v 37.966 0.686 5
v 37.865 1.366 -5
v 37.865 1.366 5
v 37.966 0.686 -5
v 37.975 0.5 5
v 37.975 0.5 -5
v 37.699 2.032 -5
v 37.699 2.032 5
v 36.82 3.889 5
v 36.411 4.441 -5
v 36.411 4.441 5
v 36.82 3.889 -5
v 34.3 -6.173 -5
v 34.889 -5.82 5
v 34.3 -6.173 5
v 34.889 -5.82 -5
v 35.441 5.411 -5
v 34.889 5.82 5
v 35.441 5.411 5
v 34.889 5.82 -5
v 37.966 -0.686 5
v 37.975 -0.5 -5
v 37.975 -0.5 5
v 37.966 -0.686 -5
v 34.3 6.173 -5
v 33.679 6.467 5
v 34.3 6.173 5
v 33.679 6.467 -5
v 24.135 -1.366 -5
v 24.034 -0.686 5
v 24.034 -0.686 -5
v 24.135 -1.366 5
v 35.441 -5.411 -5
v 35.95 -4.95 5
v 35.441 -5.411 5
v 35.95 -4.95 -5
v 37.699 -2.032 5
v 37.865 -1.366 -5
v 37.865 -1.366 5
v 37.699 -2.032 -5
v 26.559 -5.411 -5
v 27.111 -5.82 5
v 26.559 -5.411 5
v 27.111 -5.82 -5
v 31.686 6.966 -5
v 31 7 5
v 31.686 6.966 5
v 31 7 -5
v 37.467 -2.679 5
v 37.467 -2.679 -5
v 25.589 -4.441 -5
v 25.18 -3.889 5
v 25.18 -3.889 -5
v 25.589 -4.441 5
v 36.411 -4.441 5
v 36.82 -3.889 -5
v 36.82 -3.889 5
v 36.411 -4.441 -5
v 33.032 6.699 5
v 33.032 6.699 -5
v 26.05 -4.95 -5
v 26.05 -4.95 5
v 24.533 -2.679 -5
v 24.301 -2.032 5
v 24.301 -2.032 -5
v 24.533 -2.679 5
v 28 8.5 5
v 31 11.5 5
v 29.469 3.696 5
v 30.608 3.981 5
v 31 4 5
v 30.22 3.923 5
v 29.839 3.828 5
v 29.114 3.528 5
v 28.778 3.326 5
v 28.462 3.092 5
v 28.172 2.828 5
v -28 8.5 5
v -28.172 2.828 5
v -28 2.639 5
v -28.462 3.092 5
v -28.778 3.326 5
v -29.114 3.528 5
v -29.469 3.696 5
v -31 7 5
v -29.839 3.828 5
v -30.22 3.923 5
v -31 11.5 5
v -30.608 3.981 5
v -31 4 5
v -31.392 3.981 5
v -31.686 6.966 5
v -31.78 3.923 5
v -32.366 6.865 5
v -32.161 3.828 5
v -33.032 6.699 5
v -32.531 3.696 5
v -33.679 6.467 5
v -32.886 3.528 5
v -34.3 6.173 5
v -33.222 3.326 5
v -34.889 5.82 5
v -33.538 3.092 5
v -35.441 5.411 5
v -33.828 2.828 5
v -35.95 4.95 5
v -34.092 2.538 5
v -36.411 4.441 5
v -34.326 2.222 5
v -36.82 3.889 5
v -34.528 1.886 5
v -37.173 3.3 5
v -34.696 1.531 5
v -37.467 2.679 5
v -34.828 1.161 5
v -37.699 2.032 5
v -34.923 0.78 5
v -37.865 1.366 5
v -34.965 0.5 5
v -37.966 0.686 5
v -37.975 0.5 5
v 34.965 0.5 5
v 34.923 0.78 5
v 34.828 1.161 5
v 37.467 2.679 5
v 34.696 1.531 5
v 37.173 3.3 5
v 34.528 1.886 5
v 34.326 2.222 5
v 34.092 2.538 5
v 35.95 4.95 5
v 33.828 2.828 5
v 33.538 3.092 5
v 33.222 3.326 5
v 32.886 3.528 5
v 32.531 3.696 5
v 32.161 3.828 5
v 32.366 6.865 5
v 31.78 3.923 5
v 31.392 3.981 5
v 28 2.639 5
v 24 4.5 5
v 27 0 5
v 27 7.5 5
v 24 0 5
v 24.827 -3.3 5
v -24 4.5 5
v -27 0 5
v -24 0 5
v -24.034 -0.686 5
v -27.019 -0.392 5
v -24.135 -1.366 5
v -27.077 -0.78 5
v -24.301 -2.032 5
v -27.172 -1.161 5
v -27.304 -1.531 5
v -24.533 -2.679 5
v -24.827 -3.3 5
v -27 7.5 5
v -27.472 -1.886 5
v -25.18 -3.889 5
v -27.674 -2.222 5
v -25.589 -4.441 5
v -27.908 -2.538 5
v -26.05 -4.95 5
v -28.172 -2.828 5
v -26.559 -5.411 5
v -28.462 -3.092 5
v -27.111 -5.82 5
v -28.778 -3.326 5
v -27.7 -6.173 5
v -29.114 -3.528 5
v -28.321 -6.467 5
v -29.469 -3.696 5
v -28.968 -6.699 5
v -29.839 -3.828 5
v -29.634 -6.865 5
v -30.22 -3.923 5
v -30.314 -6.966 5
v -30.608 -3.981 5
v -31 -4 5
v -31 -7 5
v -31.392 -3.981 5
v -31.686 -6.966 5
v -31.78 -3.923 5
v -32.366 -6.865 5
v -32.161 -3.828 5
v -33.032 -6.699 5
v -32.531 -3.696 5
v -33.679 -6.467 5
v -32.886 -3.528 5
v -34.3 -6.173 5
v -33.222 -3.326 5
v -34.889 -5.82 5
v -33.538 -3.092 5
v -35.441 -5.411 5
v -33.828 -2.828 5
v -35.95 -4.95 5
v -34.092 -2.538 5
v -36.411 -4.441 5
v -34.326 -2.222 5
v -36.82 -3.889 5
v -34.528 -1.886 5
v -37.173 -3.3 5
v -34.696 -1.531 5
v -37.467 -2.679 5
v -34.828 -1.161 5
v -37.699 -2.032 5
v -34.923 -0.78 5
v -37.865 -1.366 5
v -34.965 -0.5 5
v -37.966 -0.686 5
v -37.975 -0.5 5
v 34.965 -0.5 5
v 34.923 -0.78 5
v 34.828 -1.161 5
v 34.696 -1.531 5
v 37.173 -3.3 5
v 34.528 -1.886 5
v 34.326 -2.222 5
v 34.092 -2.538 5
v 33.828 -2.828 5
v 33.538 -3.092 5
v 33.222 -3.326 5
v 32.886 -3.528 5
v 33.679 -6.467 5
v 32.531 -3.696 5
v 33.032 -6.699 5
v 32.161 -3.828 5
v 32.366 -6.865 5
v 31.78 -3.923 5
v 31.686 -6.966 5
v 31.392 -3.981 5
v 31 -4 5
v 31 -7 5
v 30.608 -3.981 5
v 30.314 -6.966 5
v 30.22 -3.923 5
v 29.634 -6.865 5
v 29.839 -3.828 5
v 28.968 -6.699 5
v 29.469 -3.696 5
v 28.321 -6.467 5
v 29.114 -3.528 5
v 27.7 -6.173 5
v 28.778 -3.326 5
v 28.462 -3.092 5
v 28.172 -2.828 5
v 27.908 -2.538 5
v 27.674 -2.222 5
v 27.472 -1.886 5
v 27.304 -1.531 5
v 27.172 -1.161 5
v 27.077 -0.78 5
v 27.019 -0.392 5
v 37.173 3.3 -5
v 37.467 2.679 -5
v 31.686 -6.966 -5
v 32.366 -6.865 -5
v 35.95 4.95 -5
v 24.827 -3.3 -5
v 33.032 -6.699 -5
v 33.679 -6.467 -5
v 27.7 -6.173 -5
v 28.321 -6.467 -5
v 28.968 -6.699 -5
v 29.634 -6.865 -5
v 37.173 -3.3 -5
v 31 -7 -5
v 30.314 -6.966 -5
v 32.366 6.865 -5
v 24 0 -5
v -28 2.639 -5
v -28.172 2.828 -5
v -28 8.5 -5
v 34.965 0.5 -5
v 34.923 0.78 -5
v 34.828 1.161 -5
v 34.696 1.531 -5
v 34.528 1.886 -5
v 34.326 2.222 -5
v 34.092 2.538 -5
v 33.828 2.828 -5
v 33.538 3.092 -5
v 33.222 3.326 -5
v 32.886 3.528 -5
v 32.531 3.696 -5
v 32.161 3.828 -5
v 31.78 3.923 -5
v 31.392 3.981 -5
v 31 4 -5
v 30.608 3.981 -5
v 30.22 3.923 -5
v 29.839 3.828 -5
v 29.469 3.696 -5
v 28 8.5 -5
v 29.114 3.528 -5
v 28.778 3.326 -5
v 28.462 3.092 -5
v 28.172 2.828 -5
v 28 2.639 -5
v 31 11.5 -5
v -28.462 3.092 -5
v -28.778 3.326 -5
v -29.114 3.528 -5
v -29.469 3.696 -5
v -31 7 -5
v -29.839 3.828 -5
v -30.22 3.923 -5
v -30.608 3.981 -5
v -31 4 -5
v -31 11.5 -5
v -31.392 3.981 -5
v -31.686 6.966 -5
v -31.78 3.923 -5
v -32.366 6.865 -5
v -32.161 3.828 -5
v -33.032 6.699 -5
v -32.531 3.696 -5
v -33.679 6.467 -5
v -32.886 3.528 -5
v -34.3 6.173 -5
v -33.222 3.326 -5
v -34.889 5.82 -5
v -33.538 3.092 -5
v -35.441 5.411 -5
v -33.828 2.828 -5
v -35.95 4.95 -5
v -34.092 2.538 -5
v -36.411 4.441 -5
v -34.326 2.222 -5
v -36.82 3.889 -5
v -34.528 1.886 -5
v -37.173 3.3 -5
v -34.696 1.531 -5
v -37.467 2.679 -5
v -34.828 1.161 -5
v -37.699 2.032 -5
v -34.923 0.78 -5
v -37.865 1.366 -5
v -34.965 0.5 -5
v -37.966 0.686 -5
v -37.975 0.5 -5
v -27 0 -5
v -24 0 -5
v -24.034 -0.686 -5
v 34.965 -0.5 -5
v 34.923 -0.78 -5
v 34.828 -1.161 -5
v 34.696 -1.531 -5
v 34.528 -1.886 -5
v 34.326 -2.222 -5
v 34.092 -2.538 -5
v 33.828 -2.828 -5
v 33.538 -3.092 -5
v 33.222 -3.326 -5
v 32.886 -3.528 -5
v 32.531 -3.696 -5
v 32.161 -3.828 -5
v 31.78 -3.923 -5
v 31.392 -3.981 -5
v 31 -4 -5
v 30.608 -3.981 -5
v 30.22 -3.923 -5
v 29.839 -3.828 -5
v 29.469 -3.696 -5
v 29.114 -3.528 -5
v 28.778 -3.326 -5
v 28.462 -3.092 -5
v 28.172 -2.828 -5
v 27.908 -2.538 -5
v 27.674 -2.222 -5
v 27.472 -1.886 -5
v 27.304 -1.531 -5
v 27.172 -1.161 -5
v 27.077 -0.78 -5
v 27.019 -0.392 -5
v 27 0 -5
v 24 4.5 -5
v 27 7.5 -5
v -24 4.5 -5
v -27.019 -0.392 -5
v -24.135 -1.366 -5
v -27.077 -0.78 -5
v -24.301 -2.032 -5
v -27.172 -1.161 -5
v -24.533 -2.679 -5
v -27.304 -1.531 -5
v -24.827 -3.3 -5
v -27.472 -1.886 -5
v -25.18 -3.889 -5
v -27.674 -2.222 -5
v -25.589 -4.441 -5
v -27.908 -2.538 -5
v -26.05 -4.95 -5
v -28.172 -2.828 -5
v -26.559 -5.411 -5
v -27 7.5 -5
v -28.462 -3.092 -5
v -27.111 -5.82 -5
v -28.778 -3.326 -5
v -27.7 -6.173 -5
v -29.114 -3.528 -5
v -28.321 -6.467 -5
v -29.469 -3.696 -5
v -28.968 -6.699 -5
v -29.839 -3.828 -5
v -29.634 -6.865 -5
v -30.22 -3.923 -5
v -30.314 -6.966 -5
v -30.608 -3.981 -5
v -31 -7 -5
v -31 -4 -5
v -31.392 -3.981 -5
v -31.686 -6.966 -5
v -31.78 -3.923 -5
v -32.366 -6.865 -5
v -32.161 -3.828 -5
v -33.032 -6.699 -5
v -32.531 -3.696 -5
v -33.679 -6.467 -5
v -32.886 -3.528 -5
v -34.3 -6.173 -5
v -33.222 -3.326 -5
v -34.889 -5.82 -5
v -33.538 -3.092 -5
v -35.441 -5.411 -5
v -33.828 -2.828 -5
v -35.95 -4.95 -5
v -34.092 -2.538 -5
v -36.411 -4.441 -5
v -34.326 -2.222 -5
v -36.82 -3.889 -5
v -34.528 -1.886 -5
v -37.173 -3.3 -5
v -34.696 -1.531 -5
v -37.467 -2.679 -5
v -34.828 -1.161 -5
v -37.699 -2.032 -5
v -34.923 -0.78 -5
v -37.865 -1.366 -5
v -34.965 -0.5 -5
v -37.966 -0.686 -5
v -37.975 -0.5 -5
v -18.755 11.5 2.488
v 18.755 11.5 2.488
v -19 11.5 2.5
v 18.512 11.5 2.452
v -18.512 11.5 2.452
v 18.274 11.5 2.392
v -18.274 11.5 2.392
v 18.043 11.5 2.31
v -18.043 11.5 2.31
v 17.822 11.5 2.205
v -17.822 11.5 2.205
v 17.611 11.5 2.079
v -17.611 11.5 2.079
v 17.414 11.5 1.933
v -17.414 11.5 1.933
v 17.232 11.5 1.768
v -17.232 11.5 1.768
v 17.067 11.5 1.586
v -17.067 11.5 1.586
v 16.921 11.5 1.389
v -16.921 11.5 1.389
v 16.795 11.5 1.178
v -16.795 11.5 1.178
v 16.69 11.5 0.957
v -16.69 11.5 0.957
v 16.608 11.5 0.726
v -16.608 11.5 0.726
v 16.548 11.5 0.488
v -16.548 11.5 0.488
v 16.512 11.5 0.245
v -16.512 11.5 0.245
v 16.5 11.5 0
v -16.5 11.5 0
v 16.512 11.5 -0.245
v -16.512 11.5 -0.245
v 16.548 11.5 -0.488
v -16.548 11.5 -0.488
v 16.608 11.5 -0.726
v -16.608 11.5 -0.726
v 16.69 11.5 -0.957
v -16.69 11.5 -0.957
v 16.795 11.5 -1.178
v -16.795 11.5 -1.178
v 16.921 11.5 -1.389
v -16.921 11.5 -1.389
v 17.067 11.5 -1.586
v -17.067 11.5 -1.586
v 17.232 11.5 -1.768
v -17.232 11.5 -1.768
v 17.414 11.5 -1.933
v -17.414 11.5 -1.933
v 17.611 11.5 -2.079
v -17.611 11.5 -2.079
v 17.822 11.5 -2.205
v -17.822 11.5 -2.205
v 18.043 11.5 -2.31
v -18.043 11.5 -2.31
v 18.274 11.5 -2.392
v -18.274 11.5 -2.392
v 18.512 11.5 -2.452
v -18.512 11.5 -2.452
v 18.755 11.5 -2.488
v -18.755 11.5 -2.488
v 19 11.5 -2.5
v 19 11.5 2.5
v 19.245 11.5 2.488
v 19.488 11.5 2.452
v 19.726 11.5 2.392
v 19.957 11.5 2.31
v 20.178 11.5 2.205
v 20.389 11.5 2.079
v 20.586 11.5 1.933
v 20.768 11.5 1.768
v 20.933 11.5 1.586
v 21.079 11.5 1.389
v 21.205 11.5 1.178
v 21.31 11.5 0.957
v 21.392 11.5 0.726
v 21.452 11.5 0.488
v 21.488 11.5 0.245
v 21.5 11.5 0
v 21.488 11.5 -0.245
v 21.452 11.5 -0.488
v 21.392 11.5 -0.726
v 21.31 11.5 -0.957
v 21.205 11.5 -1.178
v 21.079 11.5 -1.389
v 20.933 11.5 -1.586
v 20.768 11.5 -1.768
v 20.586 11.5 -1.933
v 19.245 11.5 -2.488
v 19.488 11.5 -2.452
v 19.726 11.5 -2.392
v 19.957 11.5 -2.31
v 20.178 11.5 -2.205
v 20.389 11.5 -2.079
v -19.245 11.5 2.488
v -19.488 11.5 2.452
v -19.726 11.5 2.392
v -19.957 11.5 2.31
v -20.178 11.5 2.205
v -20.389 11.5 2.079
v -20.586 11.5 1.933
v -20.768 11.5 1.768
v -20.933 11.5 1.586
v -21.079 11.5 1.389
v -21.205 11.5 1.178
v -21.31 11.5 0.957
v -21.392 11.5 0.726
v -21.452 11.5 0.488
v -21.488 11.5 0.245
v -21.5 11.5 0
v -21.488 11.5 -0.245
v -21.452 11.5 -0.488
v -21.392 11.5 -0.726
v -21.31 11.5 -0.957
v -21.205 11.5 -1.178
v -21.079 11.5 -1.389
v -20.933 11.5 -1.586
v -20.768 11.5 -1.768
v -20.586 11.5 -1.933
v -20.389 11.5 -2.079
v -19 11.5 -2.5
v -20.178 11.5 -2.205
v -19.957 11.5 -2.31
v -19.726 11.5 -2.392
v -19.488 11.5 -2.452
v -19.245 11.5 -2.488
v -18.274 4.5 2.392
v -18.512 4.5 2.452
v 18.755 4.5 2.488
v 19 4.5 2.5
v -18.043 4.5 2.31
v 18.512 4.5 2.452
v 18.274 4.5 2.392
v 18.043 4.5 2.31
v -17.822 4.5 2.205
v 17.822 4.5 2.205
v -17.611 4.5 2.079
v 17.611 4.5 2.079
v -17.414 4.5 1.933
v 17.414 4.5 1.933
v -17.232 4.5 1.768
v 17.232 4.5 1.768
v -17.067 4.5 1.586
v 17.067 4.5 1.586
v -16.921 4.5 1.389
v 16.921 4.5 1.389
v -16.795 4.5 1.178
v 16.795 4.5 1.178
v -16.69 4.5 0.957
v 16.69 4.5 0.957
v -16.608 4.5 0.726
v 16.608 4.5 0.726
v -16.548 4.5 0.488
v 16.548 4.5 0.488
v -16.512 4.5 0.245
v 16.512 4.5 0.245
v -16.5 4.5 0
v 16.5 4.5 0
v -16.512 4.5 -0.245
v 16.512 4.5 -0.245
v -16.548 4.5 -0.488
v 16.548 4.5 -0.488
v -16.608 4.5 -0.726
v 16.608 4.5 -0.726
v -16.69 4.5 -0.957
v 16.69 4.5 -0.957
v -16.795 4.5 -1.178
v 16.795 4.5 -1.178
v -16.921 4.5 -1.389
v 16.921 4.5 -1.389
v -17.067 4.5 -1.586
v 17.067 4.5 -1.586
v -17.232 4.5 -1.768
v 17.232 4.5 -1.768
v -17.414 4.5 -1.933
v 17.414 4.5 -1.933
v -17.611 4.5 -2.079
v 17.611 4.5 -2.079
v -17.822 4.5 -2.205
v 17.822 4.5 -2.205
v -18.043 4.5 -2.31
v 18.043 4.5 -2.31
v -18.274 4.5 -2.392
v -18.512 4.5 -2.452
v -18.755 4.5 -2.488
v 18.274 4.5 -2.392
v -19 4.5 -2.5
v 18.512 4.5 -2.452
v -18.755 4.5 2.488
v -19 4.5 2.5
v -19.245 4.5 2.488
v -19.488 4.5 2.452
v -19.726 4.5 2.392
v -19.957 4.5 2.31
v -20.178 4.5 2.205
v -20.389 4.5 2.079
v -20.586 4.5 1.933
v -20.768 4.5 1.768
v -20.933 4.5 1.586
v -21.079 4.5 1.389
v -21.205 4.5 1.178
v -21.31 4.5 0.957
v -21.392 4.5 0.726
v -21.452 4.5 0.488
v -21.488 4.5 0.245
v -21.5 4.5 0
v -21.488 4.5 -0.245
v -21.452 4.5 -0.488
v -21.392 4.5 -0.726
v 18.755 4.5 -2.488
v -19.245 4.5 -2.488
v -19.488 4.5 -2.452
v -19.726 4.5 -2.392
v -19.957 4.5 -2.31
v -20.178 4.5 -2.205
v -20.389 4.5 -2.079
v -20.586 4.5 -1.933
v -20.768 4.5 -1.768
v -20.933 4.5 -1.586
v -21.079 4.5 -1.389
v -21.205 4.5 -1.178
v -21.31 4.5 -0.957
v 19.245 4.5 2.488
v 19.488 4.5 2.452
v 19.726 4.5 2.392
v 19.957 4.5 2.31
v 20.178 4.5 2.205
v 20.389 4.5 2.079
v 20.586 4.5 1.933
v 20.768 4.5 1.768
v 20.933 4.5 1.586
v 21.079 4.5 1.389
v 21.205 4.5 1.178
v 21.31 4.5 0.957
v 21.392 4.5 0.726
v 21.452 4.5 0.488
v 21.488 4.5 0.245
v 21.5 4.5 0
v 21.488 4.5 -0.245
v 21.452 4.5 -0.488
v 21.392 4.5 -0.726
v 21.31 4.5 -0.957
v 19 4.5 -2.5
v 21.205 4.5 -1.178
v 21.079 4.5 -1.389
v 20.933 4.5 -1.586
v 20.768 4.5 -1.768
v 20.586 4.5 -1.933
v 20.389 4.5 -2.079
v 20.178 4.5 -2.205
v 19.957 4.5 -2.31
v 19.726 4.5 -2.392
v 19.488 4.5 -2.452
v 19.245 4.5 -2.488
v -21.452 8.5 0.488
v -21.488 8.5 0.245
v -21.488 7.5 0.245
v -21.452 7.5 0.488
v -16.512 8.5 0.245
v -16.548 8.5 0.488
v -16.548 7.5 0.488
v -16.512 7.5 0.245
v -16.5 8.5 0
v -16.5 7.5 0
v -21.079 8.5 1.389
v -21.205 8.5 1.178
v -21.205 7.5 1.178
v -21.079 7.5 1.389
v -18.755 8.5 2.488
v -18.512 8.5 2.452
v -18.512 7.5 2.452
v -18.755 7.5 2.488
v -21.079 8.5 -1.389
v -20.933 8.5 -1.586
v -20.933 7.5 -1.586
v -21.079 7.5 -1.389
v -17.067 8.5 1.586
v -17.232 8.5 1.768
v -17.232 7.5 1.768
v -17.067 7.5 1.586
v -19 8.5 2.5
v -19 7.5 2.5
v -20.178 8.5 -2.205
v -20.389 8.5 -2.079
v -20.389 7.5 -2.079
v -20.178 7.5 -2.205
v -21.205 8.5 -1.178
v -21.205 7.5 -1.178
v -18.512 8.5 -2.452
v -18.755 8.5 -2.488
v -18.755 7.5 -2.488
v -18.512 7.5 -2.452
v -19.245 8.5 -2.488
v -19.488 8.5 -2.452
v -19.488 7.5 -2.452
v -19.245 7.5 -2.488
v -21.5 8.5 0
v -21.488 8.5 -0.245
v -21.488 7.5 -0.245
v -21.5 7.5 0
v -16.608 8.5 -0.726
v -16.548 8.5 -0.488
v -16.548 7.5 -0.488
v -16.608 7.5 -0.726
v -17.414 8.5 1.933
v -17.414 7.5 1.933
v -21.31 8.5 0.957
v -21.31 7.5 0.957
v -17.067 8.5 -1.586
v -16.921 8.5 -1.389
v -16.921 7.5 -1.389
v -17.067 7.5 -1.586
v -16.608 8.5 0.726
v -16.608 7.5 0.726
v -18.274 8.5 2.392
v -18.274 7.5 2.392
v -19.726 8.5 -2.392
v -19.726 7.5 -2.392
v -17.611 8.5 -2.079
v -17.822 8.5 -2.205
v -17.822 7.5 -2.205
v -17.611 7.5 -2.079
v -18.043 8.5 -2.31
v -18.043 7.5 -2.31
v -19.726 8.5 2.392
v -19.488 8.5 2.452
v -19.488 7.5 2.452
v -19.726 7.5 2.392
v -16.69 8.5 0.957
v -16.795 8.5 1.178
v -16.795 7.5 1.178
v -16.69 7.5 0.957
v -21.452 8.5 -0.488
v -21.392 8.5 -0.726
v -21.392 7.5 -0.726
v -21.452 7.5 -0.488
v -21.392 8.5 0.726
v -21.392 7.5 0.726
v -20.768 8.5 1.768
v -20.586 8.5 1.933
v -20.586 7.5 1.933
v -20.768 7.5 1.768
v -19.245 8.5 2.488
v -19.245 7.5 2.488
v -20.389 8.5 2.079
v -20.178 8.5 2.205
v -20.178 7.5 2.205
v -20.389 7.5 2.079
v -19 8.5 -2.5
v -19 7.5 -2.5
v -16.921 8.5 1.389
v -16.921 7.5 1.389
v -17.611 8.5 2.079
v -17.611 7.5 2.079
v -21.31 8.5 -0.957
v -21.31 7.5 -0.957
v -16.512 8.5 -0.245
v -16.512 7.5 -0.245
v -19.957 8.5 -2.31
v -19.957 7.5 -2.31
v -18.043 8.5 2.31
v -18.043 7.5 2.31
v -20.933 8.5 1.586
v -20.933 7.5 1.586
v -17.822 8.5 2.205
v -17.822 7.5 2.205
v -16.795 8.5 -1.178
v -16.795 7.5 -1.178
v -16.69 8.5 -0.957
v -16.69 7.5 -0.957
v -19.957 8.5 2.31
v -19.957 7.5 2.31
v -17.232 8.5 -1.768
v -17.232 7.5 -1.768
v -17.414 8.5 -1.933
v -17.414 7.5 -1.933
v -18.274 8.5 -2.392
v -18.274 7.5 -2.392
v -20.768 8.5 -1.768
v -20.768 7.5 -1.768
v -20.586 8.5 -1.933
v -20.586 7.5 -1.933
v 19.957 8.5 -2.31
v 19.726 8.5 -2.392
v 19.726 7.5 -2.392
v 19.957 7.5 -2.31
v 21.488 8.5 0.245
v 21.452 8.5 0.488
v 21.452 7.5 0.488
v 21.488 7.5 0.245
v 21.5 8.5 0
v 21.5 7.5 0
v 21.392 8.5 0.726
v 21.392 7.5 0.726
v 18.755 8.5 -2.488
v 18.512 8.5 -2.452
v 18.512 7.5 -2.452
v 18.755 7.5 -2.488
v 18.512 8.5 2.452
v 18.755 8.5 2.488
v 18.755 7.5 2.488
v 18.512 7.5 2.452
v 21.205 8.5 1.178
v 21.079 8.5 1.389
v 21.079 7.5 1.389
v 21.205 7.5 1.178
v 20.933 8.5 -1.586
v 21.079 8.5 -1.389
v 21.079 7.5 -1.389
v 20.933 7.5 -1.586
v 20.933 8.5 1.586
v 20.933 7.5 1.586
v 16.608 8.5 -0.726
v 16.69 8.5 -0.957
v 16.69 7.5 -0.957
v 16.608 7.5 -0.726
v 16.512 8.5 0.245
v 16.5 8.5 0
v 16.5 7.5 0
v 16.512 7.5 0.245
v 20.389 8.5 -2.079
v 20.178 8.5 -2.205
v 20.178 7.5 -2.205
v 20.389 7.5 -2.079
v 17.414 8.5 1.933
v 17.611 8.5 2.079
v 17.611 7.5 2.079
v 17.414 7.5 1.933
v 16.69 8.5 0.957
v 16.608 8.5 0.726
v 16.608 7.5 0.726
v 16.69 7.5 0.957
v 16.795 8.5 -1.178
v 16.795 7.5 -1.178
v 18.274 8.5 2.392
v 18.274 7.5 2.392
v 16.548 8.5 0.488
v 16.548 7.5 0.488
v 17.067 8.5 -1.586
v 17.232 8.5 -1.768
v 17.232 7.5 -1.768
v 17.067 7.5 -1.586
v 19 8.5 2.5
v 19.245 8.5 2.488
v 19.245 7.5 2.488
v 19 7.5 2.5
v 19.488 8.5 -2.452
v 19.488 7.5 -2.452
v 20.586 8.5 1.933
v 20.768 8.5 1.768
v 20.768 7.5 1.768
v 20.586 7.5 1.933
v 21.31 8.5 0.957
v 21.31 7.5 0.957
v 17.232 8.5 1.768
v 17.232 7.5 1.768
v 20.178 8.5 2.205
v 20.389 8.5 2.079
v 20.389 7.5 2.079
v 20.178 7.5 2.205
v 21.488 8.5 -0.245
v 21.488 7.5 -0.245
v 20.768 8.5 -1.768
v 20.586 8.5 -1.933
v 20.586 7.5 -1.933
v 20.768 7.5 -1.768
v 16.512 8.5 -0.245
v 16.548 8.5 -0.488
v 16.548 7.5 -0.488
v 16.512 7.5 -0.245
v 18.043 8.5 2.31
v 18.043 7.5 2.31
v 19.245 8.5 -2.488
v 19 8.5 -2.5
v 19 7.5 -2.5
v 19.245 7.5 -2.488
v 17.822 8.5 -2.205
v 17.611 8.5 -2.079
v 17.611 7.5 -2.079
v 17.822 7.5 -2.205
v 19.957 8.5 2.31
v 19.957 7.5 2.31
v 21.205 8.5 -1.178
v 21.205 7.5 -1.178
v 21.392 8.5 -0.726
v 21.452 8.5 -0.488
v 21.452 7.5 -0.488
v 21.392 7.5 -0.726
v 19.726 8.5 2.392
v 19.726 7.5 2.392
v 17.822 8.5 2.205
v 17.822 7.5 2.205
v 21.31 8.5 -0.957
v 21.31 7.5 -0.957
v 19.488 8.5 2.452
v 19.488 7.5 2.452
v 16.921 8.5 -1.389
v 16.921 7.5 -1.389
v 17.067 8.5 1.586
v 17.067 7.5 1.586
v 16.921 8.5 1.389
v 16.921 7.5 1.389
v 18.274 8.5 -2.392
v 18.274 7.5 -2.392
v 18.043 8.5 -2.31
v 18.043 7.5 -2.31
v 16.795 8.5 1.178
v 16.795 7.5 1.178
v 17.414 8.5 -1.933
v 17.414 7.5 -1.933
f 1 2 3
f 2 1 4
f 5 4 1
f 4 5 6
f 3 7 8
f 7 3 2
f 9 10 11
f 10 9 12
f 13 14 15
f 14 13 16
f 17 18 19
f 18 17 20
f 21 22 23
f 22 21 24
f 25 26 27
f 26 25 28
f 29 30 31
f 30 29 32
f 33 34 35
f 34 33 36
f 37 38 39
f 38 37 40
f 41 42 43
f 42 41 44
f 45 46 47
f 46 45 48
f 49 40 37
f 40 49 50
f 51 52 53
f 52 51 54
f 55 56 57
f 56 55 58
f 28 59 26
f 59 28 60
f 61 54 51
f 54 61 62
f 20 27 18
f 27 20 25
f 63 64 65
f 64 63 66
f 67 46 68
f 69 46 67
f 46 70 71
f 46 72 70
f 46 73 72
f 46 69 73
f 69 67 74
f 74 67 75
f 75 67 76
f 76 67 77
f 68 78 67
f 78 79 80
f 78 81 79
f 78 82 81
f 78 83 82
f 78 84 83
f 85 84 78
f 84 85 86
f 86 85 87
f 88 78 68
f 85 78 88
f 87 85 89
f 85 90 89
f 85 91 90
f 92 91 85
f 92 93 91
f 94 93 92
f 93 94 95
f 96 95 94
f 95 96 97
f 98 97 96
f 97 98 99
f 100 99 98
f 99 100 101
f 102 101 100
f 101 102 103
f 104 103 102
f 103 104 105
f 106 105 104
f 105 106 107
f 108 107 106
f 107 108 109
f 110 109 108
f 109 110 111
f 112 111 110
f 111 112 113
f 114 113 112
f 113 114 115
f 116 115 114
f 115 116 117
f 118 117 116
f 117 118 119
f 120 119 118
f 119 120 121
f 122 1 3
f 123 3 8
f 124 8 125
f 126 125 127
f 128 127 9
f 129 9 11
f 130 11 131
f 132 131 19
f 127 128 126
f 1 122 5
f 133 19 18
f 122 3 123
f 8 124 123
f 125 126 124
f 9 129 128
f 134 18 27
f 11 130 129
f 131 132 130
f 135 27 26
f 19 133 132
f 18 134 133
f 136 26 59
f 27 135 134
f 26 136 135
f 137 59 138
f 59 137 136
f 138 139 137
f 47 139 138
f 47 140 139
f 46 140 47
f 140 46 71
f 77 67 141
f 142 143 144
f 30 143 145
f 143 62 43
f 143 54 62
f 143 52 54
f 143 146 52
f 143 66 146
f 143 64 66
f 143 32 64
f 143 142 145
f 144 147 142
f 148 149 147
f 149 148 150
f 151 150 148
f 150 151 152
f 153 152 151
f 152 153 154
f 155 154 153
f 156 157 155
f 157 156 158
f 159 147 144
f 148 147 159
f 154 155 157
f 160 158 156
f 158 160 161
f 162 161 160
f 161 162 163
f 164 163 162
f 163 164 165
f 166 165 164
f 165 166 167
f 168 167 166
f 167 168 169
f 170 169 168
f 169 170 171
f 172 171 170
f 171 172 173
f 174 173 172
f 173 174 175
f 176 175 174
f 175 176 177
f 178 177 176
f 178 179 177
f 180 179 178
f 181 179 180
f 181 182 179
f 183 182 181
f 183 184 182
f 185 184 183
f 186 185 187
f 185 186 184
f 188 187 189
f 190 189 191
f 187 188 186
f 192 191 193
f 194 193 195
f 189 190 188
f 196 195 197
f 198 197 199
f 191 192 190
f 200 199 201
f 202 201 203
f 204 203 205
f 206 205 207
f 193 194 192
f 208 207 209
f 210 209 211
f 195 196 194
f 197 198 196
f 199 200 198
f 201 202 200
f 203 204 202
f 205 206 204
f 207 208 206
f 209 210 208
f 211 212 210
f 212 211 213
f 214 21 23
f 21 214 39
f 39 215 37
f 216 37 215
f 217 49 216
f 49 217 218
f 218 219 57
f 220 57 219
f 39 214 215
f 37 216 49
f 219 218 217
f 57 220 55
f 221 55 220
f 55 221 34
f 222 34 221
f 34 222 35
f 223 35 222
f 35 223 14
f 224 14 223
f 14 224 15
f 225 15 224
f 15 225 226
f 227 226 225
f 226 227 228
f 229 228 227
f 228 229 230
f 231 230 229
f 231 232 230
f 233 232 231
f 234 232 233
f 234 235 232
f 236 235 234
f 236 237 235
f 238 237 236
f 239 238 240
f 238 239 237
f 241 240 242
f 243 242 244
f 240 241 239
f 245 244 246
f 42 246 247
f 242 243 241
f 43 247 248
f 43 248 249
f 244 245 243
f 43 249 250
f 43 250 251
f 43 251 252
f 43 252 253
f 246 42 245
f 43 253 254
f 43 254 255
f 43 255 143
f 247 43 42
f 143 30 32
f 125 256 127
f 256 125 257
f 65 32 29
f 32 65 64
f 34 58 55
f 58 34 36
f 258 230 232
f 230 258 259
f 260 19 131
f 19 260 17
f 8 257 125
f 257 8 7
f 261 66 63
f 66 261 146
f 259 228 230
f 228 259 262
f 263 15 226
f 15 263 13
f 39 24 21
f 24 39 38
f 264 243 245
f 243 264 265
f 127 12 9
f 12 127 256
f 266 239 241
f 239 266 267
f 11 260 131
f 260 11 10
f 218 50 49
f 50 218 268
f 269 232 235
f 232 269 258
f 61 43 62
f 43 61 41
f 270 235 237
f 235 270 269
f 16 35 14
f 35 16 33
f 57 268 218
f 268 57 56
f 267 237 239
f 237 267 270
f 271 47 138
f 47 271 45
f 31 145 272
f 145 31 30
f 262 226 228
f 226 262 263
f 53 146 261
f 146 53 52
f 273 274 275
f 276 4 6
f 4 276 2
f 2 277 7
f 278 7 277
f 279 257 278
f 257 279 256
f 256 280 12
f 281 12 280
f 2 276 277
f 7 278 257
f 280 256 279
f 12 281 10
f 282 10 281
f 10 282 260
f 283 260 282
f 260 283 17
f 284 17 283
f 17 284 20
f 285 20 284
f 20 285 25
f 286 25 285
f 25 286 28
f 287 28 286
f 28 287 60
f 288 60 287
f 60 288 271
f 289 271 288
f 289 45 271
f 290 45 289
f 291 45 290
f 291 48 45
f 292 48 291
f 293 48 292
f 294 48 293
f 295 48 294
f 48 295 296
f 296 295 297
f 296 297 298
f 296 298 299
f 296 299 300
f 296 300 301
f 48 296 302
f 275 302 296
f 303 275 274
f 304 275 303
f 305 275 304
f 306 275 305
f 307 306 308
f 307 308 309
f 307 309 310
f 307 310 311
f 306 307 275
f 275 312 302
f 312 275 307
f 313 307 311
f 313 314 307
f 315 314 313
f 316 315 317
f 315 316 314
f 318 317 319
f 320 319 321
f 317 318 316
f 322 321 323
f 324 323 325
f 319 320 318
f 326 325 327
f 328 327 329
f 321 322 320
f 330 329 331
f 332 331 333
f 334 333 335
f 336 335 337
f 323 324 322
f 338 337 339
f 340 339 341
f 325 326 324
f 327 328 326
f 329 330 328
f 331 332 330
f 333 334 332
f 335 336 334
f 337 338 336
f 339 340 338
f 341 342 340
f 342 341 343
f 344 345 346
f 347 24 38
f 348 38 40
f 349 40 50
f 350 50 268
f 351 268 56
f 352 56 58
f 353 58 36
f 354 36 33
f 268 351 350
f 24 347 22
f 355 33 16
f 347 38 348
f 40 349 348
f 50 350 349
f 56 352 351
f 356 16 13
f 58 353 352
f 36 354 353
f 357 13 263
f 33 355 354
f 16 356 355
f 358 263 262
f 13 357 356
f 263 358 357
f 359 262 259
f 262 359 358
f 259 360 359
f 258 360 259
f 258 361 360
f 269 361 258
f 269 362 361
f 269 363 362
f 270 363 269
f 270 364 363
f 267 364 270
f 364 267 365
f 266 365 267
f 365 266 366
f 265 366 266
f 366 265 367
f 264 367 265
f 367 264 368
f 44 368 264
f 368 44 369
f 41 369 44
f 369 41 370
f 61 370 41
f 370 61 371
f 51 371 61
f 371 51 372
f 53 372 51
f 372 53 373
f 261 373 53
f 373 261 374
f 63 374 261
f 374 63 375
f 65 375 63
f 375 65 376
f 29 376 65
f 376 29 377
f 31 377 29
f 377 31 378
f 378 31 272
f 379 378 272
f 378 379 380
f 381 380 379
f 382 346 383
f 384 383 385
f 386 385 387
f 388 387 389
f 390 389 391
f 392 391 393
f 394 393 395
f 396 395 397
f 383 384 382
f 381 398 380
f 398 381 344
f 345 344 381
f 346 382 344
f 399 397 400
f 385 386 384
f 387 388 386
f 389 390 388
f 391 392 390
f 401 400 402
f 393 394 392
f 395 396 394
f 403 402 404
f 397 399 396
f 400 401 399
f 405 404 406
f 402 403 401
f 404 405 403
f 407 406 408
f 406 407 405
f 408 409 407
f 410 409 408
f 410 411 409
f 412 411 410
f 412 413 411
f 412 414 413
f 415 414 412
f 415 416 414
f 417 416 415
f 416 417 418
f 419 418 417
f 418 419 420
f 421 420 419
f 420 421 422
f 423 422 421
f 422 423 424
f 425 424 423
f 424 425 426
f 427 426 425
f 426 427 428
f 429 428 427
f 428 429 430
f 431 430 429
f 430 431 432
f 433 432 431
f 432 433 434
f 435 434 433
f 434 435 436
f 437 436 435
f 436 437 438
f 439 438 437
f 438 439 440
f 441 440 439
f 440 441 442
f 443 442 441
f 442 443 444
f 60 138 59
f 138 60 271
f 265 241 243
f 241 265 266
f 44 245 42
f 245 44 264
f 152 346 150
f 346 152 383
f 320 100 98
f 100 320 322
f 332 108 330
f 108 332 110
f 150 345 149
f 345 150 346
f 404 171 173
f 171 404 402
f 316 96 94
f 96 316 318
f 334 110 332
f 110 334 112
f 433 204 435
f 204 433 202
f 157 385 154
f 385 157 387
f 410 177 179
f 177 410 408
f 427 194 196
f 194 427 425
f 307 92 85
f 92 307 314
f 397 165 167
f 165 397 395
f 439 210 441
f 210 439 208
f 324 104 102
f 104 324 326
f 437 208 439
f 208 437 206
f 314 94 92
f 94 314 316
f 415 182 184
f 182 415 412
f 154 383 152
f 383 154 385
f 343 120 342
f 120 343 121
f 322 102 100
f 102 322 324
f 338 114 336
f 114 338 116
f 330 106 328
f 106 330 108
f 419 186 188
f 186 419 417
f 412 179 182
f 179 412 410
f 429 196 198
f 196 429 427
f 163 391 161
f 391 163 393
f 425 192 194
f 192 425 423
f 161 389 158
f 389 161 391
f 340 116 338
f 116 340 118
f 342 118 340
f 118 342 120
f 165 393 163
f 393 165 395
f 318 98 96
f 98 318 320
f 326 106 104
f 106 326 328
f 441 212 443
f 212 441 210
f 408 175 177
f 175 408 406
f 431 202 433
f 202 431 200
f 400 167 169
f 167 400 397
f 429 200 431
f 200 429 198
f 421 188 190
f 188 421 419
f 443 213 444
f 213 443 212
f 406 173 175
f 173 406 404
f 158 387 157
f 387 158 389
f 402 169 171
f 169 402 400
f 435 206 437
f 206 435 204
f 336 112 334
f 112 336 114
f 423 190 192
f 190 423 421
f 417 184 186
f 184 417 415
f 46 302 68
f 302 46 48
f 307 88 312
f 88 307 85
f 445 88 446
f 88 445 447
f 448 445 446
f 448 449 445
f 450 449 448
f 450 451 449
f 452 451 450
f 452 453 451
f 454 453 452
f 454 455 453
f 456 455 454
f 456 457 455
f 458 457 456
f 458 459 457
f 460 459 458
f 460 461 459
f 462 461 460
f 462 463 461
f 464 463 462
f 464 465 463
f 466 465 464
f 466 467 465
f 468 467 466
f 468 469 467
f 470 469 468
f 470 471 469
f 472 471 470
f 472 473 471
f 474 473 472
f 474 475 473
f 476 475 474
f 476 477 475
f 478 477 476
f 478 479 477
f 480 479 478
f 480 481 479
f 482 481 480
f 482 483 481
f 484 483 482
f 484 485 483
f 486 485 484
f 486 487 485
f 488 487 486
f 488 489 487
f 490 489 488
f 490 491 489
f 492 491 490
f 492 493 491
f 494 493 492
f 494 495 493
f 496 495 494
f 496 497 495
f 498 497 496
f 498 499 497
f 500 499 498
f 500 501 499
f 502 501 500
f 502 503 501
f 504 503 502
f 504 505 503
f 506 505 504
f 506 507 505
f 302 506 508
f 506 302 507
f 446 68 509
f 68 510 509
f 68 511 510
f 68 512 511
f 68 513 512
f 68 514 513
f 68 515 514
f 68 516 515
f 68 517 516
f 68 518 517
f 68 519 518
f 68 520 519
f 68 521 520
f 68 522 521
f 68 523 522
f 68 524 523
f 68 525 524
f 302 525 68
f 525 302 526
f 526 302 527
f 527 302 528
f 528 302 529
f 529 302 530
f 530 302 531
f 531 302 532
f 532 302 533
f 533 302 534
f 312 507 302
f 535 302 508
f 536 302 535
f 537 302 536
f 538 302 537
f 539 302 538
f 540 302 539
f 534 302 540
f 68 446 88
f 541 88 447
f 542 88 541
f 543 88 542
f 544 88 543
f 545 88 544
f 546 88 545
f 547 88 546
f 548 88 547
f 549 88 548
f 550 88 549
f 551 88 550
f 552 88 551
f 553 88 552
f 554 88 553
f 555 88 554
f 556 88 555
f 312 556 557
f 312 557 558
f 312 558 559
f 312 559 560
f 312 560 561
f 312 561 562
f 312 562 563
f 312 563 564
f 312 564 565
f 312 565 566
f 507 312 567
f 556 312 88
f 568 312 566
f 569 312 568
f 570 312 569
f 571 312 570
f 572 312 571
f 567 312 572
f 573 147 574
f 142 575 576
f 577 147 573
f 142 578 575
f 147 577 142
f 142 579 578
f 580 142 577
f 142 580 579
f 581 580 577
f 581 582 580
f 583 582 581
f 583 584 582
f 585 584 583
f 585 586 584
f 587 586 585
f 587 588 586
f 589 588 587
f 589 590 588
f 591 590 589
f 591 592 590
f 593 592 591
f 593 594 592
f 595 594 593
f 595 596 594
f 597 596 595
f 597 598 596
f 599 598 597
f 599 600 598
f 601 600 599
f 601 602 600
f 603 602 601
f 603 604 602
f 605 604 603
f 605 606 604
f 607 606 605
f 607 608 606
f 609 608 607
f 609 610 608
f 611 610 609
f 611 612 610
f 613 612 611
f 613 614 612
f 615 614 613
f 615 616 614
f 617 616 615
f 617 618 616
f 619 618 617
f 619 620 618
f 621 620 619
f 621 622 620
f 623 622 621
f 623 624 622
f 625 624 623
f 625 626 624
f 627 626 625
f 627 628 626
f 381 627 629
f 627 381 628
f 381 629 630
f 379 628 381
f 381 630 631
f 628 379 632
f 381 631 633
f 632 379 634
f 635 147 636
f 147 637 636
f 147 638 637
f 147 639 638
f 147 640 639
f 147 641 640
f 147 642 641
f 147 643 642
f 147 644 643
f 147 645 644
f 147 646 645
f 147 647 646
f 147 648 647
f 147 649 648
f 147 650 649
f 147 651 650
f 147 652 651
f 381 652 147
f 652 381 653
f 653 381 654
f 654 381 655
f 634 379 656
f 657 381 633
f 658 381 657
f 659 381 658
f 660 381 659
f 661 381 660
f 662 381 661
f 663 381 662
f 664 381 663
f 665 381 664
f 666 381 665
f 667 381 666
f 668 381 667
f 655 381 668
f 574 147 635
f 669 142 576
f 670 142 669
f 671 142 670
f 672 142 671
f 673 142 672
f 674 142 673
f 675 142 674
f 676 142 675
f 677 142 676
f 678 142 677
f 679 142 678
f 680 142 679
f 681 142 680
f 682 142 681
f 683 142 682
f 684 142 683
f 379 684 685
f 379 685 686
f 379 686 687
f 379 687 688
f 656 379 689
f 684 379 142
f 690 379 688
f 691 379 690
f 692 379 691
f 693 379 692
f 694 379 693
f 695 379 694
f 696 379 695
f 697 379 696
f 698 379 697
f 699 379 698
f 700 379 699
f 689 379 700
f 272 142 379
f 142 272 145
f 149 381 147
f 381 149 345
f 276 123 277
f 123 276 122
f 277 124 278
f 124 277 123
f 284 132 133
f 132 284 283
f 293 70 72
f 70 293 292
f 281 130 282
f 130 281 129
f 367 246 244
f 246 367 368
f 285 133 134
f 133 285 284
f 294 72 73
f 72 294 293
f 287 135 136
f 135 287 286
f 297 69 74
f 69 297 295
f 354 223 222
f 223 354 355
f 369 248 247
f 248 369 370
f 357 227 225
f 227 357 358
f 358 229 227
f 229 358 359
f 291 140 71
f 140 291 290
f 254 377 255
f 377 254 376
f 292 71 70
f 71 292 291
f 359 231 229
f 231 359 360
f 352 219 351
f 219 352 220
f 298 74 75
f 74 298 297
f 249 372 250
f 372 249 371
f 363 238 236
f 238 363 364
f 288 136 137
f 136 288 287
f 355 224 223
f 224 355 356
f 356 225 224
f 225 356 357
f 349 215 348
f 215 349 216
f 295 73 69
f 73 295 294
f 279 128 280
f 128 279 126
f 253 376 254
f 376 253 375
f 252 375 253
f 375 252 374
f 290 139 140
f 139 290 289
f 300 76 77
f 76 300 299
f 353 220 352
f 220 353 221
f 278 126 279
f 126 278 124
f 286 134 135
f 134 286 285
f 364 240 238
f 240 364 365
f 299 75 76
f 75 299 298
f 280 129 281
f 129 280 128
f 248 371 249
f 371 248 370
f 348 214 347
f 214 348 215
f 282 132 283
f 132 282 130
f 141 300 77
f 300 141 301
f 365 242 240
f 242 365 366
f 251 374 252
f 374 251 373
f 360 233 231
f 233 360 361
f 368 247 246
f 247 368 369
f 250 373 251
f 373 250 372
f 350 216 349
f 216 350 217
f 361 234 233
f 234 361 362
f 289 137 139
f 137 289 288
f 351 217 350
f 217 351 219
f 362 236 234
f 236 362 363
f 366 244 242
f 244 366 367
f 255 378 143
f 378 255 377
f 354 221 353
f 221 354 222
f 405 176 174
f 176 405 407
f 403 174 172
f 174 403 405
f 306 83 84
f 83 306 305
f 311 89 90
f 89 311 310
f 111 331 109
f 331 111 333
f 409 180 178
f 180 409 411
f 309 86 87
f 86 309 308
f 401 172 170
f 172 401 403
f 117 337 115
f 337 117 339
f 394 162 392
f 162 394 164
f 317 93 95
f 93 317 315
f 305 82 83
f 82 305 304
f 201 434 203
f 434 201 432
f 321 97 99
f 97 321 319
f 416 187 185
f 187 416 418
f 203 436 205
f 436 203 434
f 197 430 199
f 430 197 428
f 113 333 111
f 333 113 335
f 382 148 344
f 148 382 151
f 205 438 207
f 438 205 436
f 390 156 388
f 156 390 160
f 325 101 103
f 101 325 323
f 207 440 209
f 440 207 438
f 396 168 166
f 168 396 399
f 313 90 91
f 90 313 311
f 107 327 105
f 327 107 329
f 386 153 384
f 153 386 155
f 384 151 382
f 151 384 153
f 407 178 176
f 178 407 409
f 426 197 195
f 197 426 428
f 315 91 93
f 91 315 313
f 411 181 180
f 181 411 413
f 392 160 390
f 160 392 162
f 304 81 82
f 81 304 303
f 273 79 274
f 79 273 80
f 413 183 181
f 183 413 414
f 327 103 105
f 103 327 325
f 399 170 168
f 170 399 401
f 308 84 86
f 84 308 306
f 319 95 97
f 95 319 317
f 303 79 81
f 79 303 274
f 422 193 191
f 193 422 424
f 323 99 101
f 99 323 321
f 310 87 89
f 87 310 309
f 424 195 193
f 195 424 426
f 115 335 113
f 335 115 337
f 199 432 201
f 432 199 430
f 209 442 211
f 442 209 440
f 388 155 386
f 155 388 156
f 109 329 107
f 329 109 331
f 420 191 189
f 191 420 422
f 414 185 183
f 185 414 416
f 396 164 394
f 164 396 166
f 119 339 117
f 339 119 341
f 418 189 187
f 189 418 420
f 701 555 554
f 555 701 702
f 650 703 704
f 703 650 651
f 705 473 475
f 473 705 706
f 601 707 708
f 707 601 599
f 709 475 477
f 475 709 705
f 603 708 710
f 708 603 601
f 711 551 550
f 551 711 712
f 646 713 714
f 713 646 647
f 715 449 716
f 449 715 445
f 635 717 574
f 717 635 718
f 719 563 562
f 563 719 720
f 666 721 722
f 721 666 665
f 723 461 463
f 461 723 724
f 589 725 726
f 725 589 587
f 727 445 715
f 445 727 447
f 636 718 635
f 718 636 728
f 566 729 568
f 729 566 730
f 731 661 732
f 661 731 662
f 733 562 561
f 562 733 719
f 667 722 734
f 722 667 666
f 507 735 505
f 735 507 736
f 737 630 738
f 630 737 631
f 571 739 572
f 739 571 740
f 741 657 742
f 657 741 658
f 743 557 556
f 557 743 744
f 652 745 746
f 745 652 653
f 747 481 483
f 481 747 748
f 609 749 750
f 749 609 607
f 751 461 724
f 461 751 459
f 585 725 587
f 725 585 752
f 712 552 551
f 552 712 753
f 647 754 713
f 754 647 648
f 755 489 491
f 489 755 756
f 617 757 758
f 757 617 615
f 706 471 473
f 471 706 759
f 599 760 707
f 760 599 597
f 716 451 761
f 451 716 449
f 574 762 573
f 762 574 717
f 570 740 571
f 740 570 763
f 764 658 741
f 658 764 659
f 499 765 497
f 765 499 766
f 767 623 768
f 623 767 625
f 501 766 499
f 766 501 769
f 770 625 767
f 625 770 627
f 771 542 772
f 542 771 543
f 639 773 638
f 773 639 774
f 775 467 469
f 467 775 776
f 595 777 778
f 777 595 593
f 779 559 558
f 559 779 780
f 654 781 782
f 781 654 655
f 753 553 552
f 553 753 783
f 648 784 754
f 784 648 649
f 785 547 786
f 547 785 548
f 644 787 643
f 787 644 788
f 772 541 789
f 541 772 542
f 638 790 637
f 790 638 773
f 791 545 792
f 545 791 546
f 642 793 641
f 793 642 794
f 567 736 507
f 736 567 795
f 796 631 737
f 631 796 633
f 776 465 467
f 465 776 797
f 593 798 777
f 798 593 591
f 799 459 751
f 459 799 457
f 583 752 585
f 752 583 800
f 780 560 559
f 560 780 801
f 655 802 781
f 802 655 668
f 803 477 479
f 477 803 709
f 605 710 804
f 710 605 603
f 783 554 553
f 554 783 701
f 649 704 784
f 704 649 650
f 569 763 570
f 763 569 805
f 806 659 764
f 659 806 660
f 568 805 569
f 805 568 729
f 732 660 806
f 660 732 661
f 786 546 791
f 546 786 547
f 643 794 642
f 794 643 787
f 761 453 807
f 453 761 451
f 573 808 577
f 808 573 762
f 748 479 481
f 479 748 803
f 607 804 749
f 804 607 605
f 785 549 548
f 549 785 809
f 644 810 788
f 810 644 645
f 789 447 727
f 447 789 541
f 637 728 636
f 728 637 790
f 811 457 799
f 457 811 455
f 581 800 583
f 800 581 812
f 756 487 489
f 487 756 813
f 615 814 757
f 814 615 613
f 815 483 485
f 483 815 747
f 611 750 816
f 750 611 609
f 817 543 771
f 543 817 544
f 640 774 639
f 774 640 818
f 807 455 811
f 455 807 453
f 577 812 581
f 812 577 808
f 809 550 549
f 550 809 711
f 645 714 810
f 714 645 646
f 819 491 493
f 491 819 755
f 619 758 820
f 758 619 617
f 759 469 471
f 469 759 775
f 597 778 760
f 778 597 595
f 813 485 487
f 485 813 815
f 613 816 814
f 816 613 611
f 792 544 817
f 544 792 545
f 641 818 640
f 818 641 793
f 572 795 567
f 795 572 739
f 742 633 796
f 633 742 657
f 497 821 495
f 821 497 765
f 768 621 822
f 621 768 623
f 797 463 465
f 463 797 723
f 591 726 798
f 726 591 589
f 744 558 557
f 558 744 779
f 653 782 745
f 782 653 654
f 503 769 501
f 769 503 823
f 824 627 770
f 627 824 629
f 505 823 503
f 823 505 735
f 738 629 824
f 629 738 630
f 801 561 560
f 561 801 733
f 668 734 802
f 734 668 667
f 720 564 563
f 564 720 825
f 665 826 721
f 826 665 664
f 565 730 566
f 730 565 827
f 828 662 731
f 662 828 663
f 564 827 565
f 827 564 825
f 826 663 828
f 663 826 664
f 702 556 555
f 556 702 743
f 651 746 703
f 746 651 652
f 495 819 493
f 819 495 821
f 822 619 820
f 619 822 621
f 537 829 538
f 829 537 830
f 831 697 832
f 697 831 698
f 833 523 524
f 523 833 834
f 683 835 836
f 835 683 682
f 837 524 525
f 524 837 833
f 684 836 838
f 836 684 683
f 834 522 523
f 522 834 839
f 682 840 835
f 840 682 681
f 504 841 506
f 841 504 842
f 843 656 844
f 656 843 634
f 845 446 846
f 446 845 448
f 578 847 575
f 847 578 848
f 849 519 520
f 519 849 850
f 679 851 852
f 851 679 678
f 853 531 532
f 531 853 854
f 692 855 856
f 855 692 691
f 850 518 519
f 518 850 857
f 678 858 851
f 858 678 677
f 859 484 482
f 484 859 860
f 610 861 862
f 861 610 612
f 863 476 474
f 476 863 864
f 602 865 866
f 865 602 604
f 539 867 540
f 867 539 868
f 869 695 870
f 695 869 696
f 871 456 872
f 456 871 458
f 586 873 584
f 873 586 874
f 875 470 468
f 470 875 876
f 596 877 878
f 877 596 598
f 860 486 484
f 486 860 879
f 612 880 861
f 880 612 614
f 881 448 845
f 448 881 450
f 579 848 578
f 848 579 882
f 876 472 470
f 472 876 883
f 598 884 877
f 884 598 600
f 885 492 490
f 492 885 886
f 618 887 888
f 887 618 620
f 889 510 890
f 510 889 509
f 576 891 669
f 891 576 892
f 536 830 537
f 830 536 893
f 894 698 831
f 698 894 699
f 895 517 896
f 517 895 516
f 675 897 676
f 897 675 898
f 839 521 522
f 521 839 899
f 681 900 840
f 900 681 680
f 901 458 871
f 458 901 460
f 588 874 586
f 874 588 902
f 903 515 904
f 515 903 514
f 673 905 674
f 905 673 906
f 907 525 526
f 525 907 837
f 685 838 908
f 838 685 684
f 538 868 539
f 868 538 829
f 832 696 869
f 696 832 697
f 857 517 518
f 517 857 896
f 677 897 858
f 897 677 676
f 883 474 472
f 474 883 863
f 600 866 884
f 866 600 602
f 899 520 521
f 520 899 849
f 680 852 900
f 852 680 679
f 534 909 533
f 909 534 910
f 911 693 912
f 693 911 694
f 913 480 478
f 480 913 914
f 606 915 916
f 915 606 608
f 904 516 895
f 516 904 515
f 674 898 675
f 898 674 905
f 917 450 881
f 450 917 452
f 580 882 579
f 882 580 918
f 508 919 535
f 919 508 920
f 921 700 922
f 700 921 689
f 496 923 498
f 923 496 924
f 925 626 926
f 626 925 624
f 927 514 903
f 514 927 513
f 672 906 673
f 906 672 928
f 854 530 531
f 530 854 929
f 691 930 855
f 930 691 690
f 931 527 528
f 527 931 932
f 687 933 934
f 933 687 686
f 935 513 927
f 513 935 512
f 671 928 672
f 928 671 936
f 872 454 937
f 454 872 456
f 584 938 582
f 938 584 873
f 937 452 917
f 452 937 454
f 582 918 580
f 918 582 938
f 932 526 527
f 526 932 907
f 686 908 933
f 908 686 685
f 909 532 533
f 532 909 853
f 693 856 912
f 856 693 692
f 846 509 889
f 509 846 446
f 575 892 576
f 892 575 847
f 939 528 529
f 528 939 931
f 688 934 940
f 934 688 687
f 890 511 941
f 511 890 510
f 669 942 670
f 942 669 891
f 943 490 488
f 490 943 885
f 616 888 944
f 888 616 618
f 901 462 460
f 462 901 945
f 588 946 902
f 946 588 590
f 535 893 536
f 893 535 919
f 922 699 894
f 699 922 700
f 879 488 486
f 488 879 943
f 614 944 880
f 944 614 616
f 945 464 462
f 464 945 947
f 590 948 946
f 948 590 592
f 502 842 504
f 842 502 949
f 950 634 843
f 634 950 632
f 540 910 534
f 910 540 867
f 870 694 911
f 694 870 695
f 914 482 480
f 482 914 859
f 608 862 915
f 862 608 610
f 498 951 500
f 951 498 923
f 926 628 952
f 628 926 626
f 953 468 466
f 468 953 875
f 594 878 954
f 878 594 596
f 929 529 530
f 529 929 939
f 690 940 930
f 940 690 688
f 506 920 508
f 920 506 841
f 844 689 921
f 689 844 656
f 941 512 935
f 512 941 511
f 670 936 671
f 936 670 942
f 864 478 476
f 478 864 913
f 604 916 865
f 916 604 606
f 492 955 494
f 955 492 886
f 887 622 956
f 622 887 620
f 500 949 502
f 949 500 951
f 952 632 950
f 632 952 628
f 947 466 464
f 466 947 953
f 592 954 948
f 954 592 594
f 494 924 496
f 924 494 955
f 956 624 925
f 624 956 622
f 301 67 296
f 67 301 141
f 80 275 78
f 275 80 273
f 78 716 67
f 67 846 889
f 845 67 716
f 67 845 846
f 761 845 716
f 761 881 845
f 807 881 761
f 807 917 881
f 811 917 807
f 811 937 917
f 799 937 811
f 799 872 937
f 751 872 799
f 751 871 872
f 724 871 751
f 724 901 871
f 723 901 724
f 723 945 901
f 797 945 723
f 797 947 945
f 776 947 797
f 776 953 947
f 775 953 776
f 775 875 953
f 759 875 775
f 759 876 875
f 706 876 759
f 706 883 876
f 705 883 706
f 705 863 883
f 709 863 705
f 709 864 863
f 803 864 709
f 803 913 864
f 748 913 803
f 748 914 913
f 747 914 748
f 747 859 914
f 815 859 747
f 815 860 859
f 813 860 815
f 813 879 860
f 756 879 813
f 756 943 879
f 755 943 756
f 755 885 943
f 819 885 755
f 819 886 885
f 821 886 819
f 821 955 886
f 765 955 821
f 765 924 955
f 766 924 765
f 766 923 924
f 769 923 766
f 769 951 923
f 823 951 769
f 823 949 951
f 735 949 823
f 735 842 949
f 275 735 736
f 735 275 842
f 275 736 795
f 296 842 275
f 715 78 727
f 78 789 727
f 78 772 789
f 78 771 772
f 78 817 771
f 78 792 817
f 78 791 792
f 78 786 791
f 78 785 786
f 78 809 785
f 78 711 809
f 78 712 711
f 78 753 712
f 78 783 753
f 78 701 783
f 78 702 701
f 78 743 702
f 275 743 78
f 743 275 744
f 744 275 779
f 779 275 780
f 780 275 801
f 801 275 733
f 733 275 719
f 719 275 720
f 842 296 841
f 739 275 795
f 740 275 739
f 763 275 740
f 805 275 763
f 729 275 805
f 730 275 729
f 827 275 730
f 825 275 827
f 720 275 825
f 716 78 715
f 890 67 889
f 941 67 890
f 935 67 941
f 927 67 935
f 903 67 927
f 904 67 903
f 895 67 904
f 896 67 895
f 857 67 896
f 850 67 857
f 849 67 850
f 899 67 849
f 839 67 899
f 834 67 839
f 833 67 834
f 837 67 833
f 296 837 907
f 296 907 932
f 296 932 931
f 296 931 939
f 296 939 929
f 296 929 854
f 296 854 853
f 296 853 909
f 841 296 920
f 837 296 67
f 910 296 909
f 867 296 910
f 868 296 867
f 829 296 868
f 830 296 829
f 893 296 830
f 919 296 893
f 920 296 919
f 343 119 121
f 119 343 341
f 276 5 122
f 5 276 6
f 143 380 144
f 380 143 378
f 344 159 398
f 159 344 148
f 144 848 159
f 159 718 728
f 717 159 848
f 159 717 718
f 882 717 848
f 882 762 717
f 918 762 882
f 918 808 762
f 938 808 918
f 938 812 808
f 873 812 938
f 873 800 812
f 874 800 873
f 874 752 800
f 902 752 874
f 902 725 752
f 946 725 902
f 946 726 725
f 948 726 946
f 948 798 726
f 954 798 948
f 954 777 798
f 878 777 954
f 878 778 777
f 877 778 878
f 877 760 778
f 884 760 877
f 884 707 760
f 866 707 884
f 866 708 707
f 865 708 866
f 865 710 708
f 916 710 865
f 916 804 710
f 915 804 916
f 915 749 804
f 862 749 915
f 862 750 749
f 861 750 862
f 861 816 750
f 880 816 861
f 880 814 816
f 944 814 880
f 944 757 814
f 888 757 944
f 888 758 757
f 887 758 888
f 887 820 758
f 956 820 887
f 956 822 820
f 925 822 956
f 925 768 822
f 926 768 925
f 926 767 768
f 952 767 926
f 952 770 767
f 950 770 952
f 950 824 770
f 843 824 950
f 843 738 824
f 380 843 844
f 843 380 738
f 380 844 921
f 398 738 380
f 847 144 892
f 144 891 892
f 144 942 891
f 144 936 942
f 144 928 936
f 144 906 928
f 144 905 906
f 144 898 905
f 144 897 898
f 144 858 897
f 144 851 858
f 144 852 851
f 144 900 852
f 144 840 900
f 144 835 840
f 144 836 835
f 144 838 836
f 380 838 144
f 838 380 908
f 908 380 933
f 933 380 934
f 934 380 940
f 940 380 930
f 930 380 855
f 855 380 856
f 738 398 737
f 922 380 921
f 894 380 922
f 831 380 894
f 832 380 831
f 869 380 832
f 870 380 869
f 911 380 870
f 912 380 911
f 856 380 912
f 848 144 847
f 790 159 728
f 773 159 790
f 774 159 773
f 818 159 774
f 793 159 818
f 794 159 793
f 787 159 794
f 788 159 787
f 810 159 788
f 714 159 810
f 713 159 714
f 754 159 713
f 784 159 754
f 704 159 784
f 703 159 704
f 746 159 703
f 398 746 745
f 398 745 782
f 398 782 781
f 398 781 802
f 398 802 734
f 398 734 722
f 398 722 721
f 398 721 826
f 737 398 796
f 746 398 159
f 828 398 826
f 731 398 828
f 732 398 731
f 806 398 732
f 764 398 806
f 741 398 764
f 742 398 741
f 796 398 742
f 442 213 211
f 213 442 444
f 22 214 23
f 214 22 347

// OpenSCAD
part = "all"; // [bigger,smaller,all]
rod_diameter=8;
rods_distance=62;
offset=8;
mount_hole=5;
mount_hole_distance=38;
part_width=10;
part_thickness=3;
air_gap=1;
$fn=64;
module whole(){
    translate([rods_distance/2,0,0])cylinder(d=rod_diameter+2*part_thickness, h=part_width, center=true);
             translate([-rods_distance/2,0,0])cylinder(d=rod_diameter+2*part_thickness, h=part_width, center=true);
     translate([0,offset,0])cube([rods_distance-rod_diameter+2*part_thickness+2*air_gap,2*part_thickness+air_gap,part_width],center=true);
       translate([rods_distance/2-rod_diameter/2+air_gap/2,(offset-part_thickness-air_gap/2)/2,0])cube([2*part_thickness+air_gap,offset-part_thickness-air_gap/2,part_width],center=true);
       translate([-rods_distance/2+rod_diameter/2-air_gap/2,(offset-part_thickness-air_gap/2)/2,0])cube([2*part_thickness+air_gap,offset-part_thickness-air_gap/2,part_width],center=true);
    }
module holes(){
    translate([rods_distance/2,0,0])cylinder(d=rod_diameter,h=part_width+2,center=true);
    translate([-rods_distance/2,0,0])cylinder(d=rod_diameter,h=part_width+2,center=true);
    translate([-mount_hole_distance/2,offset,0])rotate([90,0,0])cylinder(d=mount_hole, h=2*part_thickness+air_gap+2, center=true);         
             translate([mount_hole_distance/2,offset,0])rotate([90,0,0])cylinder(d=mount_hole, h=2*part_thickness+air_gap+2, center=true);
    }
module bigger() {
    difference(){
        whole();
        holes();
        cutter(air_gap);
        }
}
module smaller() {
    intersection(){
    difference(){
        whole();
        holes();
        }
        cutter(0);
    }
}
module cutter(gap){
    translate([(rod_diameter-rods_distance)/2-gap,-rod_diameter/2-part_thickness,-part_width/2-1])cube([rods_distance-rod_diameter+2*gap,part_thickness+rod_diameter/2+offset-air_gap/2+gap,part_width+2]);
    translate([-(rods_distance+rod_diameter+2*part_thickness)/2-1,-rod_diameter/2-part_thickness,-part_width/2-1])cube([rods_distance+rod_diameter+2*part_thickness+2,part_thickness+rod_diameter/2-air_gap/2+gap,part_width+2]);
    translate([rods_distance/2-rod_diameter/2,-rod_diameter/2-max(0,air_gap/2-offset),-(part_width+2)/2])cube([rod_diameter/2,rod_diameter/2,part_width+2]);
    translate([-rods_distance/2,-rod_diameter/2-max(0,air_gap/2-offset),-(part_width+2)/2])cube([rod_diameter/2,rod_diameter/2,part_width+2]);
}
module divider(gap)
{
    translate([0,offset-part_thickness-gap/2,0])cube([rods_distance-rod_diameter,2*part_thickness+air_gap,part_width],center=true);
    cube([rods_distance-rod_diameter,2*offset,part_width],center=true);
    
    /*
    cube([rods_distance-rod_diameter+air_gap-gap,(2*offset-gap),part_width+2],center=true);
    translate([0,(-rod_diameter/2-part_thickness-1-gap)/2,0])cube([rods_distance,rod_diameter/2+part_thickness+1,part_width+2],center=true);
    translate([0,-rod_diameter/2-part_thickness-gap/2,0])cube([rods_distance+rod_diameter+2*part_thickness+1,rod_diameter+2*part_thickness,part_width+2],center=true);
    */
    }
if (part=="test") {
    difference(){whole();holes();}
}
if (part=="bigger") {
bigger();
}
if (part=="smaller") {
    smaller();
}
if (part=="all")
{
    bigger();
    smaller();
    }
